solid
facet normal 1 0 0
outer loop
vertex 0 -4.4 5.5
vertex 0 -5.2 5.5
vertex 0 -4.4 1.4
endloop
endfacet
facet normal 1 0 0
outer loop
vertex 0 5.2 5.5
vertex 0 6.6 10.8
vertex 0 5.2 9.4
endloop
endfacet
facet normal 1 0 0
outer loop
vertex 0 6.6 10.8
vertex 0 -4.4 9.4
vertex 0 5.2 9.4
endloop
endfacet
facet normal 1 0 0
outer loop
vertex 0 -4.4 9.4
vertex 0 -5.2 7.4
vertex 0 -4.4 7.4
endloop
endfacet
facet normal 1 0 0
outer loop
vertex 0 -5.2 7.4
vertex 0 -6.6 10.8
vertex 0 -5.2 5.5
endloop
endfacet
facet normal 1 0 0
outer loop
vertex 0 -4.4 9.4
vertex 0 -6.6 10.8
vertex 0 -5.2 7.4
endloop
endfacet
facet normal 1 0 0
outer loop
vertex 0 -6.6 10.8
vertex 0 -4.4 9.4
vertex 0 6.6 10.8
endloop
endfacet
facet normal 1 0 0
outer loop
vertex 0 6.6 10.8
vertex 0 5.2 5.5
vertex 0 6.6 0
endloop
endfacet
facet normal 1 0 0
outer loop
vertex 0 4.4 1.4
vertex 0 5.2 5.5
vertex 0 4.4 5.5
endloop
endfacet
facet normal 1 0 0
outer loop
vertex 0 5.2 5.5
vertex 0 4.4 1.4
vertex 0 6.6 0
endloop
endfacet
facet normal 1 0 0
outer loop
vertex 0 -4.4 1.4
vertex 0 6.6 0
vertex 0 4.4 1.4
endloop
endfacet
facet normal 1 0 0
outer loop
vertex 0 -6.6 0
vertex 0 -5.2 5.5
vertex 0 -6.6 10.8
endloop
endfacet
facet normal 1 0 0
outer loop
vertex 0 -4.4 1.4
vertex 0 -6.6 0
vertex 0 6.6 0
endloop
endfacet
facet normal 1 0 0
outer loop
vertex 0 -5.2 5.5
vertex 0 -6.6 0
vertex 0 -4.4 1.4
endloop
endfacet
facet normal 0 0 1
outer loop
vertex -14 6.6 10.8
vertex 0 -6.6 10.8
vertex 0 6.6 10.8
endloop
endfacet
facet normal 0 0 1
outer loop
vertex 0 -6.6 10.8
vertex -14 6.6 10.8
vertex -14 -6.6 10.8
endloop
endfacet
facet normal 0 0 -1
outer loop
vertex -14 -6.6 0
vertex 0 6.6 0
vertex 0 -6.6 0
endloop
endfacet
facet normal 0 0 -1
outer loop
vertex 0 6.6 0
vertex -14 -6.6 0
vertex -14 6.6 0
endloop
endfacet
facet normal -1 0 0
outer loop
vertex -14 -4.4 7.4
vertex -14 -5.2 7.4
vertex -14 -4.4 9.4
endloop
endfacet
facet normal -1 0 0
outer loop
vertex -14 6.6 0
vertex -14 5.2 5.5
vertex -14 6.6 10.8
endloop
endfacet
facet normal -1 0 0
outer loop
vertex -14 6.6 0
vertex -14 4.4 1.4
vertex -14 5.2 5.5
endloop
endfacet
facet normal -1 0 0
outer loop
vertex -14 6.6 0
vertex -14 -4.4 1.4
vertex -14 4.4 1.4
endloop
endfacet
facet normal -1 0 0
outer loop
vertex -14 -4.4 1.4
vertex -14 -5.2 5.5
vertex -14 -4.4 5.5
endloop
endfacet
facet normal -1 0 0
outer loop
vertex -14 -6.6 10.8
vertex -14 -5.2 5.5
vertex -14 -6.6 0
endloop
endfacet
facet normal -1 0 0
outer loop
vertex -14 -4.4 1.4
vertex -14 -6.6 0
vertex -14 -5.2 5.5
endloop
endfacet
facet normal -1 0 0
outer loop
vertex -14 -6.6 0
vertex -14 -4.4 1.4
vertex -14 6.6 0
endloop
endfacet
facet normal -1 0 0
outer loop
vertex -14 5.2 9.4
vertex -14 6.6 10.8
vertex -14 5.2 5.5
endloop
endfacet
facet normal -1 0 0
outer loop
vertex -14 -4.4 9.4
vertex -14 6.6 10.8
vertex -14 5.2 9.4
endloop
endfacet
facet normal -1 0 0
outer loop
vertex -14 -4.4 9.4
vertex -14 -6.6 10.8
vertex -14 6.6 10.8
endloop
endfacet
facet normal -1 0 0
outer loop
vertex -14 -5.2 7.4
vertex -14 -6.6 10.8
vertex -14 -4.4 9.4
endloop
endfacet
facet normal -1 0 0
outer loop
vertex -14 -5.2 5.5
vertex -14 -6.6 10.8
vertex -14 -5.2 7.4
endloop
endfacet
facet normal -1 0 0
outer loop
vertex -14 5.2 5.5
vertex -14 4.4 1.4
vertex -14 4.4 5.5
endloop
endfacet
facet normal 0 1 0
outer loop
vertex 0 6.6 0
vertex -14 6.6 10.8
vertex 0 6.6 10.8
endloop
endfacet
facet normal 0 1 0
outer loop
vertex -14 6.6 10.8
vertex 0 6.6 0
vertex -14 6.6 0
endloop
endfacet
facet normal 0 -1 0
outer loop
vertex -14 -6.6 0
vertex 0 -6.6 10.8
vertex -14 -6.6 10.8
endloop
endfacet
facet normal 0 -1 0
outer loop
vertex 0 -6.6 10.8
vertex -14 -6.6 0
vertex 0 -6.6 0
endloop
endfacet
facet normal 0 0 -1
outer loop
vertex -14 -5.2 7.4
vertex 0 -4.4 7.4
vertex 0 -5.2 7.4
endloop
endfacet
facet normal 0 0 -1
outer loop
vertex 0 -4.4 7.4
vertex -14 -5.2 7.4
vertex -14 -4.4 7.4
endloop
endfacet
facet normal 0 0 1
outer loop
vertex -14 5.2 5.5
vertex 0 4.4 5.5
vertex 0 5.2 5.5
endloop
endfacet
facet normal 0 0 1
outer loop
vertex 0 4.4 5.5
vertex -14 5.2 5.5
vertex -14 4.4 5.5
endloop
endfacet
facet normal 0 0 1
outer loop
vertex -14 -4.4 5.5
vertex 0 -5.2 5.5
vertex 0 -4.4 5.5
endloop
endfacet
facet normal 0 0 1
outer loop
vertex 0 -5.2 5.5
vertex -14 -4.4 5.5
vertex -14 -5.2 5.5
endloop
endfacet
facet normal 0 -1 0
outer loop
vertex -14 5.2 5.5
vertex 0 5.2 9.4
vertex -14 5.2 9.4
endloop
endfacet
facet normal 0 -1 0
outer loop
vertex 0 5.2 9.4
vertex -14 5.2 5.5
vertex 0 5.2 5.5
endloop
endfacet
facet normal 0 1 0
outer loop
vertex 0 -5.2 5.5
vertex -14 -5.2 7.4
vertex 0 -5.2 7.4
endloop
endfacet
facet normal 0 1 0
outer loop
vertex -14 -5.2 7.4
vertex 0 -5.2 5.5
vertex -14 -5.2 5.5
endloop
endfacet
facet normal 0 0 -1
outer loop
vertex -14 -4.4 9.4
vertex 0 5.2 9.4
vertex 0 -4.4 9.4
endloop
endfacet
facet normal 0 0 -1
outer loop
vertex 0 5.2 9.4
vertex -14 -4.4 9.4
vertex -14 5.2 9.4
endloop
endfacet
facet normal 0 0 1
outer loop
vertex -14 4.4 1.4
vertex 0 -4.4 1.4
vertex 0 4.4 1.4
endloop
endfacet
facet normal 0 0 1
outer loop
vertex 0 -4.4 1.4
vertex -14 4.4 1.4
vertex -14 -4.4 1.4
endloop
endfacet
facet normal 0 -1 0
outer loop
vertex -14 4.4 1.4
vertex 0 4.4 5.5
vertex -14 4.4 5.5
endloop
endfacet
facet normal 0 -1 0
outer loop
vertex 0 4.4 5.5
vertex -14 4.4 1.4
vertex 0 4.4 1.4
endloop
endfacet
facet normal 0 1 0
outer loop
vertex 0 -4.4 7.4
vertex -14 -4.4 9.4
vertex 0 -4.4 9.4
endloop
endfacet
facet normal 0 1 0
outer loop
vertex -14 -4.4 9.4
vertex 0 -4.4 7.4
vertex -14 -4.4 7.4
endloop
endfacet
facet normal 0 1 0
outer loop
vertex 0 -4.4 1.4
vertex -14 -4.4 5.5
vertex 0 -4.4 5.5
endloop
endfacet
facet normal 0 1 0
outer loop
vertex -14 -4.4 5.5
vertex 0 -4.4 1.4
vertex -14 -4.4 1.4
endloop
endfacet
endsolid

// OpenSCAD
module mount_pir() {
    board_depth = 14;
    board_width = 10;
    board_height = 8;
    board_thickness = 1.5;
    board_margin = 1.0;
    margin = 0.2;
    wall_thickness = 1.4;
    
    d1 = board_depth;
    w1 = board_width + 2*margin + 2*wall_thickness;
    h1 = board_height + 2*wall_thickness;
    
    d2 = d1 + 2;
    w2 = board_width + 2*margin;
    h2 = board_thickness + 2*margin;
    
    d3 = d1 + 2;
    w3 = w2 - 2*board_margin + 2*margin;
    h3 = h1 - 2*wall_thickness;
    
    difference() {
        // main box
        color("#77e")
        translate([-d1, -w1/2, 0])
        cube([d1, w1, h1]);
        
        // cut board
        color("#cce")
        translate([-d2+1, -w2/2, 5.5])
        cube([d2, w2, h2]);
        
        // cut board right side
        color("#cce")
        translate([-d2+1, -w2/2+board_margin, board_height-2*margin-0.3])
        cube([d2, w2-board_margin, h2-margin+0.4]);
        
        // cut front/back
        color("#cce")
        translate([-d3+1, -w3/2, wall_thickness])
        cube([d3, w3, h3]);
    }
}

mount_pir();
